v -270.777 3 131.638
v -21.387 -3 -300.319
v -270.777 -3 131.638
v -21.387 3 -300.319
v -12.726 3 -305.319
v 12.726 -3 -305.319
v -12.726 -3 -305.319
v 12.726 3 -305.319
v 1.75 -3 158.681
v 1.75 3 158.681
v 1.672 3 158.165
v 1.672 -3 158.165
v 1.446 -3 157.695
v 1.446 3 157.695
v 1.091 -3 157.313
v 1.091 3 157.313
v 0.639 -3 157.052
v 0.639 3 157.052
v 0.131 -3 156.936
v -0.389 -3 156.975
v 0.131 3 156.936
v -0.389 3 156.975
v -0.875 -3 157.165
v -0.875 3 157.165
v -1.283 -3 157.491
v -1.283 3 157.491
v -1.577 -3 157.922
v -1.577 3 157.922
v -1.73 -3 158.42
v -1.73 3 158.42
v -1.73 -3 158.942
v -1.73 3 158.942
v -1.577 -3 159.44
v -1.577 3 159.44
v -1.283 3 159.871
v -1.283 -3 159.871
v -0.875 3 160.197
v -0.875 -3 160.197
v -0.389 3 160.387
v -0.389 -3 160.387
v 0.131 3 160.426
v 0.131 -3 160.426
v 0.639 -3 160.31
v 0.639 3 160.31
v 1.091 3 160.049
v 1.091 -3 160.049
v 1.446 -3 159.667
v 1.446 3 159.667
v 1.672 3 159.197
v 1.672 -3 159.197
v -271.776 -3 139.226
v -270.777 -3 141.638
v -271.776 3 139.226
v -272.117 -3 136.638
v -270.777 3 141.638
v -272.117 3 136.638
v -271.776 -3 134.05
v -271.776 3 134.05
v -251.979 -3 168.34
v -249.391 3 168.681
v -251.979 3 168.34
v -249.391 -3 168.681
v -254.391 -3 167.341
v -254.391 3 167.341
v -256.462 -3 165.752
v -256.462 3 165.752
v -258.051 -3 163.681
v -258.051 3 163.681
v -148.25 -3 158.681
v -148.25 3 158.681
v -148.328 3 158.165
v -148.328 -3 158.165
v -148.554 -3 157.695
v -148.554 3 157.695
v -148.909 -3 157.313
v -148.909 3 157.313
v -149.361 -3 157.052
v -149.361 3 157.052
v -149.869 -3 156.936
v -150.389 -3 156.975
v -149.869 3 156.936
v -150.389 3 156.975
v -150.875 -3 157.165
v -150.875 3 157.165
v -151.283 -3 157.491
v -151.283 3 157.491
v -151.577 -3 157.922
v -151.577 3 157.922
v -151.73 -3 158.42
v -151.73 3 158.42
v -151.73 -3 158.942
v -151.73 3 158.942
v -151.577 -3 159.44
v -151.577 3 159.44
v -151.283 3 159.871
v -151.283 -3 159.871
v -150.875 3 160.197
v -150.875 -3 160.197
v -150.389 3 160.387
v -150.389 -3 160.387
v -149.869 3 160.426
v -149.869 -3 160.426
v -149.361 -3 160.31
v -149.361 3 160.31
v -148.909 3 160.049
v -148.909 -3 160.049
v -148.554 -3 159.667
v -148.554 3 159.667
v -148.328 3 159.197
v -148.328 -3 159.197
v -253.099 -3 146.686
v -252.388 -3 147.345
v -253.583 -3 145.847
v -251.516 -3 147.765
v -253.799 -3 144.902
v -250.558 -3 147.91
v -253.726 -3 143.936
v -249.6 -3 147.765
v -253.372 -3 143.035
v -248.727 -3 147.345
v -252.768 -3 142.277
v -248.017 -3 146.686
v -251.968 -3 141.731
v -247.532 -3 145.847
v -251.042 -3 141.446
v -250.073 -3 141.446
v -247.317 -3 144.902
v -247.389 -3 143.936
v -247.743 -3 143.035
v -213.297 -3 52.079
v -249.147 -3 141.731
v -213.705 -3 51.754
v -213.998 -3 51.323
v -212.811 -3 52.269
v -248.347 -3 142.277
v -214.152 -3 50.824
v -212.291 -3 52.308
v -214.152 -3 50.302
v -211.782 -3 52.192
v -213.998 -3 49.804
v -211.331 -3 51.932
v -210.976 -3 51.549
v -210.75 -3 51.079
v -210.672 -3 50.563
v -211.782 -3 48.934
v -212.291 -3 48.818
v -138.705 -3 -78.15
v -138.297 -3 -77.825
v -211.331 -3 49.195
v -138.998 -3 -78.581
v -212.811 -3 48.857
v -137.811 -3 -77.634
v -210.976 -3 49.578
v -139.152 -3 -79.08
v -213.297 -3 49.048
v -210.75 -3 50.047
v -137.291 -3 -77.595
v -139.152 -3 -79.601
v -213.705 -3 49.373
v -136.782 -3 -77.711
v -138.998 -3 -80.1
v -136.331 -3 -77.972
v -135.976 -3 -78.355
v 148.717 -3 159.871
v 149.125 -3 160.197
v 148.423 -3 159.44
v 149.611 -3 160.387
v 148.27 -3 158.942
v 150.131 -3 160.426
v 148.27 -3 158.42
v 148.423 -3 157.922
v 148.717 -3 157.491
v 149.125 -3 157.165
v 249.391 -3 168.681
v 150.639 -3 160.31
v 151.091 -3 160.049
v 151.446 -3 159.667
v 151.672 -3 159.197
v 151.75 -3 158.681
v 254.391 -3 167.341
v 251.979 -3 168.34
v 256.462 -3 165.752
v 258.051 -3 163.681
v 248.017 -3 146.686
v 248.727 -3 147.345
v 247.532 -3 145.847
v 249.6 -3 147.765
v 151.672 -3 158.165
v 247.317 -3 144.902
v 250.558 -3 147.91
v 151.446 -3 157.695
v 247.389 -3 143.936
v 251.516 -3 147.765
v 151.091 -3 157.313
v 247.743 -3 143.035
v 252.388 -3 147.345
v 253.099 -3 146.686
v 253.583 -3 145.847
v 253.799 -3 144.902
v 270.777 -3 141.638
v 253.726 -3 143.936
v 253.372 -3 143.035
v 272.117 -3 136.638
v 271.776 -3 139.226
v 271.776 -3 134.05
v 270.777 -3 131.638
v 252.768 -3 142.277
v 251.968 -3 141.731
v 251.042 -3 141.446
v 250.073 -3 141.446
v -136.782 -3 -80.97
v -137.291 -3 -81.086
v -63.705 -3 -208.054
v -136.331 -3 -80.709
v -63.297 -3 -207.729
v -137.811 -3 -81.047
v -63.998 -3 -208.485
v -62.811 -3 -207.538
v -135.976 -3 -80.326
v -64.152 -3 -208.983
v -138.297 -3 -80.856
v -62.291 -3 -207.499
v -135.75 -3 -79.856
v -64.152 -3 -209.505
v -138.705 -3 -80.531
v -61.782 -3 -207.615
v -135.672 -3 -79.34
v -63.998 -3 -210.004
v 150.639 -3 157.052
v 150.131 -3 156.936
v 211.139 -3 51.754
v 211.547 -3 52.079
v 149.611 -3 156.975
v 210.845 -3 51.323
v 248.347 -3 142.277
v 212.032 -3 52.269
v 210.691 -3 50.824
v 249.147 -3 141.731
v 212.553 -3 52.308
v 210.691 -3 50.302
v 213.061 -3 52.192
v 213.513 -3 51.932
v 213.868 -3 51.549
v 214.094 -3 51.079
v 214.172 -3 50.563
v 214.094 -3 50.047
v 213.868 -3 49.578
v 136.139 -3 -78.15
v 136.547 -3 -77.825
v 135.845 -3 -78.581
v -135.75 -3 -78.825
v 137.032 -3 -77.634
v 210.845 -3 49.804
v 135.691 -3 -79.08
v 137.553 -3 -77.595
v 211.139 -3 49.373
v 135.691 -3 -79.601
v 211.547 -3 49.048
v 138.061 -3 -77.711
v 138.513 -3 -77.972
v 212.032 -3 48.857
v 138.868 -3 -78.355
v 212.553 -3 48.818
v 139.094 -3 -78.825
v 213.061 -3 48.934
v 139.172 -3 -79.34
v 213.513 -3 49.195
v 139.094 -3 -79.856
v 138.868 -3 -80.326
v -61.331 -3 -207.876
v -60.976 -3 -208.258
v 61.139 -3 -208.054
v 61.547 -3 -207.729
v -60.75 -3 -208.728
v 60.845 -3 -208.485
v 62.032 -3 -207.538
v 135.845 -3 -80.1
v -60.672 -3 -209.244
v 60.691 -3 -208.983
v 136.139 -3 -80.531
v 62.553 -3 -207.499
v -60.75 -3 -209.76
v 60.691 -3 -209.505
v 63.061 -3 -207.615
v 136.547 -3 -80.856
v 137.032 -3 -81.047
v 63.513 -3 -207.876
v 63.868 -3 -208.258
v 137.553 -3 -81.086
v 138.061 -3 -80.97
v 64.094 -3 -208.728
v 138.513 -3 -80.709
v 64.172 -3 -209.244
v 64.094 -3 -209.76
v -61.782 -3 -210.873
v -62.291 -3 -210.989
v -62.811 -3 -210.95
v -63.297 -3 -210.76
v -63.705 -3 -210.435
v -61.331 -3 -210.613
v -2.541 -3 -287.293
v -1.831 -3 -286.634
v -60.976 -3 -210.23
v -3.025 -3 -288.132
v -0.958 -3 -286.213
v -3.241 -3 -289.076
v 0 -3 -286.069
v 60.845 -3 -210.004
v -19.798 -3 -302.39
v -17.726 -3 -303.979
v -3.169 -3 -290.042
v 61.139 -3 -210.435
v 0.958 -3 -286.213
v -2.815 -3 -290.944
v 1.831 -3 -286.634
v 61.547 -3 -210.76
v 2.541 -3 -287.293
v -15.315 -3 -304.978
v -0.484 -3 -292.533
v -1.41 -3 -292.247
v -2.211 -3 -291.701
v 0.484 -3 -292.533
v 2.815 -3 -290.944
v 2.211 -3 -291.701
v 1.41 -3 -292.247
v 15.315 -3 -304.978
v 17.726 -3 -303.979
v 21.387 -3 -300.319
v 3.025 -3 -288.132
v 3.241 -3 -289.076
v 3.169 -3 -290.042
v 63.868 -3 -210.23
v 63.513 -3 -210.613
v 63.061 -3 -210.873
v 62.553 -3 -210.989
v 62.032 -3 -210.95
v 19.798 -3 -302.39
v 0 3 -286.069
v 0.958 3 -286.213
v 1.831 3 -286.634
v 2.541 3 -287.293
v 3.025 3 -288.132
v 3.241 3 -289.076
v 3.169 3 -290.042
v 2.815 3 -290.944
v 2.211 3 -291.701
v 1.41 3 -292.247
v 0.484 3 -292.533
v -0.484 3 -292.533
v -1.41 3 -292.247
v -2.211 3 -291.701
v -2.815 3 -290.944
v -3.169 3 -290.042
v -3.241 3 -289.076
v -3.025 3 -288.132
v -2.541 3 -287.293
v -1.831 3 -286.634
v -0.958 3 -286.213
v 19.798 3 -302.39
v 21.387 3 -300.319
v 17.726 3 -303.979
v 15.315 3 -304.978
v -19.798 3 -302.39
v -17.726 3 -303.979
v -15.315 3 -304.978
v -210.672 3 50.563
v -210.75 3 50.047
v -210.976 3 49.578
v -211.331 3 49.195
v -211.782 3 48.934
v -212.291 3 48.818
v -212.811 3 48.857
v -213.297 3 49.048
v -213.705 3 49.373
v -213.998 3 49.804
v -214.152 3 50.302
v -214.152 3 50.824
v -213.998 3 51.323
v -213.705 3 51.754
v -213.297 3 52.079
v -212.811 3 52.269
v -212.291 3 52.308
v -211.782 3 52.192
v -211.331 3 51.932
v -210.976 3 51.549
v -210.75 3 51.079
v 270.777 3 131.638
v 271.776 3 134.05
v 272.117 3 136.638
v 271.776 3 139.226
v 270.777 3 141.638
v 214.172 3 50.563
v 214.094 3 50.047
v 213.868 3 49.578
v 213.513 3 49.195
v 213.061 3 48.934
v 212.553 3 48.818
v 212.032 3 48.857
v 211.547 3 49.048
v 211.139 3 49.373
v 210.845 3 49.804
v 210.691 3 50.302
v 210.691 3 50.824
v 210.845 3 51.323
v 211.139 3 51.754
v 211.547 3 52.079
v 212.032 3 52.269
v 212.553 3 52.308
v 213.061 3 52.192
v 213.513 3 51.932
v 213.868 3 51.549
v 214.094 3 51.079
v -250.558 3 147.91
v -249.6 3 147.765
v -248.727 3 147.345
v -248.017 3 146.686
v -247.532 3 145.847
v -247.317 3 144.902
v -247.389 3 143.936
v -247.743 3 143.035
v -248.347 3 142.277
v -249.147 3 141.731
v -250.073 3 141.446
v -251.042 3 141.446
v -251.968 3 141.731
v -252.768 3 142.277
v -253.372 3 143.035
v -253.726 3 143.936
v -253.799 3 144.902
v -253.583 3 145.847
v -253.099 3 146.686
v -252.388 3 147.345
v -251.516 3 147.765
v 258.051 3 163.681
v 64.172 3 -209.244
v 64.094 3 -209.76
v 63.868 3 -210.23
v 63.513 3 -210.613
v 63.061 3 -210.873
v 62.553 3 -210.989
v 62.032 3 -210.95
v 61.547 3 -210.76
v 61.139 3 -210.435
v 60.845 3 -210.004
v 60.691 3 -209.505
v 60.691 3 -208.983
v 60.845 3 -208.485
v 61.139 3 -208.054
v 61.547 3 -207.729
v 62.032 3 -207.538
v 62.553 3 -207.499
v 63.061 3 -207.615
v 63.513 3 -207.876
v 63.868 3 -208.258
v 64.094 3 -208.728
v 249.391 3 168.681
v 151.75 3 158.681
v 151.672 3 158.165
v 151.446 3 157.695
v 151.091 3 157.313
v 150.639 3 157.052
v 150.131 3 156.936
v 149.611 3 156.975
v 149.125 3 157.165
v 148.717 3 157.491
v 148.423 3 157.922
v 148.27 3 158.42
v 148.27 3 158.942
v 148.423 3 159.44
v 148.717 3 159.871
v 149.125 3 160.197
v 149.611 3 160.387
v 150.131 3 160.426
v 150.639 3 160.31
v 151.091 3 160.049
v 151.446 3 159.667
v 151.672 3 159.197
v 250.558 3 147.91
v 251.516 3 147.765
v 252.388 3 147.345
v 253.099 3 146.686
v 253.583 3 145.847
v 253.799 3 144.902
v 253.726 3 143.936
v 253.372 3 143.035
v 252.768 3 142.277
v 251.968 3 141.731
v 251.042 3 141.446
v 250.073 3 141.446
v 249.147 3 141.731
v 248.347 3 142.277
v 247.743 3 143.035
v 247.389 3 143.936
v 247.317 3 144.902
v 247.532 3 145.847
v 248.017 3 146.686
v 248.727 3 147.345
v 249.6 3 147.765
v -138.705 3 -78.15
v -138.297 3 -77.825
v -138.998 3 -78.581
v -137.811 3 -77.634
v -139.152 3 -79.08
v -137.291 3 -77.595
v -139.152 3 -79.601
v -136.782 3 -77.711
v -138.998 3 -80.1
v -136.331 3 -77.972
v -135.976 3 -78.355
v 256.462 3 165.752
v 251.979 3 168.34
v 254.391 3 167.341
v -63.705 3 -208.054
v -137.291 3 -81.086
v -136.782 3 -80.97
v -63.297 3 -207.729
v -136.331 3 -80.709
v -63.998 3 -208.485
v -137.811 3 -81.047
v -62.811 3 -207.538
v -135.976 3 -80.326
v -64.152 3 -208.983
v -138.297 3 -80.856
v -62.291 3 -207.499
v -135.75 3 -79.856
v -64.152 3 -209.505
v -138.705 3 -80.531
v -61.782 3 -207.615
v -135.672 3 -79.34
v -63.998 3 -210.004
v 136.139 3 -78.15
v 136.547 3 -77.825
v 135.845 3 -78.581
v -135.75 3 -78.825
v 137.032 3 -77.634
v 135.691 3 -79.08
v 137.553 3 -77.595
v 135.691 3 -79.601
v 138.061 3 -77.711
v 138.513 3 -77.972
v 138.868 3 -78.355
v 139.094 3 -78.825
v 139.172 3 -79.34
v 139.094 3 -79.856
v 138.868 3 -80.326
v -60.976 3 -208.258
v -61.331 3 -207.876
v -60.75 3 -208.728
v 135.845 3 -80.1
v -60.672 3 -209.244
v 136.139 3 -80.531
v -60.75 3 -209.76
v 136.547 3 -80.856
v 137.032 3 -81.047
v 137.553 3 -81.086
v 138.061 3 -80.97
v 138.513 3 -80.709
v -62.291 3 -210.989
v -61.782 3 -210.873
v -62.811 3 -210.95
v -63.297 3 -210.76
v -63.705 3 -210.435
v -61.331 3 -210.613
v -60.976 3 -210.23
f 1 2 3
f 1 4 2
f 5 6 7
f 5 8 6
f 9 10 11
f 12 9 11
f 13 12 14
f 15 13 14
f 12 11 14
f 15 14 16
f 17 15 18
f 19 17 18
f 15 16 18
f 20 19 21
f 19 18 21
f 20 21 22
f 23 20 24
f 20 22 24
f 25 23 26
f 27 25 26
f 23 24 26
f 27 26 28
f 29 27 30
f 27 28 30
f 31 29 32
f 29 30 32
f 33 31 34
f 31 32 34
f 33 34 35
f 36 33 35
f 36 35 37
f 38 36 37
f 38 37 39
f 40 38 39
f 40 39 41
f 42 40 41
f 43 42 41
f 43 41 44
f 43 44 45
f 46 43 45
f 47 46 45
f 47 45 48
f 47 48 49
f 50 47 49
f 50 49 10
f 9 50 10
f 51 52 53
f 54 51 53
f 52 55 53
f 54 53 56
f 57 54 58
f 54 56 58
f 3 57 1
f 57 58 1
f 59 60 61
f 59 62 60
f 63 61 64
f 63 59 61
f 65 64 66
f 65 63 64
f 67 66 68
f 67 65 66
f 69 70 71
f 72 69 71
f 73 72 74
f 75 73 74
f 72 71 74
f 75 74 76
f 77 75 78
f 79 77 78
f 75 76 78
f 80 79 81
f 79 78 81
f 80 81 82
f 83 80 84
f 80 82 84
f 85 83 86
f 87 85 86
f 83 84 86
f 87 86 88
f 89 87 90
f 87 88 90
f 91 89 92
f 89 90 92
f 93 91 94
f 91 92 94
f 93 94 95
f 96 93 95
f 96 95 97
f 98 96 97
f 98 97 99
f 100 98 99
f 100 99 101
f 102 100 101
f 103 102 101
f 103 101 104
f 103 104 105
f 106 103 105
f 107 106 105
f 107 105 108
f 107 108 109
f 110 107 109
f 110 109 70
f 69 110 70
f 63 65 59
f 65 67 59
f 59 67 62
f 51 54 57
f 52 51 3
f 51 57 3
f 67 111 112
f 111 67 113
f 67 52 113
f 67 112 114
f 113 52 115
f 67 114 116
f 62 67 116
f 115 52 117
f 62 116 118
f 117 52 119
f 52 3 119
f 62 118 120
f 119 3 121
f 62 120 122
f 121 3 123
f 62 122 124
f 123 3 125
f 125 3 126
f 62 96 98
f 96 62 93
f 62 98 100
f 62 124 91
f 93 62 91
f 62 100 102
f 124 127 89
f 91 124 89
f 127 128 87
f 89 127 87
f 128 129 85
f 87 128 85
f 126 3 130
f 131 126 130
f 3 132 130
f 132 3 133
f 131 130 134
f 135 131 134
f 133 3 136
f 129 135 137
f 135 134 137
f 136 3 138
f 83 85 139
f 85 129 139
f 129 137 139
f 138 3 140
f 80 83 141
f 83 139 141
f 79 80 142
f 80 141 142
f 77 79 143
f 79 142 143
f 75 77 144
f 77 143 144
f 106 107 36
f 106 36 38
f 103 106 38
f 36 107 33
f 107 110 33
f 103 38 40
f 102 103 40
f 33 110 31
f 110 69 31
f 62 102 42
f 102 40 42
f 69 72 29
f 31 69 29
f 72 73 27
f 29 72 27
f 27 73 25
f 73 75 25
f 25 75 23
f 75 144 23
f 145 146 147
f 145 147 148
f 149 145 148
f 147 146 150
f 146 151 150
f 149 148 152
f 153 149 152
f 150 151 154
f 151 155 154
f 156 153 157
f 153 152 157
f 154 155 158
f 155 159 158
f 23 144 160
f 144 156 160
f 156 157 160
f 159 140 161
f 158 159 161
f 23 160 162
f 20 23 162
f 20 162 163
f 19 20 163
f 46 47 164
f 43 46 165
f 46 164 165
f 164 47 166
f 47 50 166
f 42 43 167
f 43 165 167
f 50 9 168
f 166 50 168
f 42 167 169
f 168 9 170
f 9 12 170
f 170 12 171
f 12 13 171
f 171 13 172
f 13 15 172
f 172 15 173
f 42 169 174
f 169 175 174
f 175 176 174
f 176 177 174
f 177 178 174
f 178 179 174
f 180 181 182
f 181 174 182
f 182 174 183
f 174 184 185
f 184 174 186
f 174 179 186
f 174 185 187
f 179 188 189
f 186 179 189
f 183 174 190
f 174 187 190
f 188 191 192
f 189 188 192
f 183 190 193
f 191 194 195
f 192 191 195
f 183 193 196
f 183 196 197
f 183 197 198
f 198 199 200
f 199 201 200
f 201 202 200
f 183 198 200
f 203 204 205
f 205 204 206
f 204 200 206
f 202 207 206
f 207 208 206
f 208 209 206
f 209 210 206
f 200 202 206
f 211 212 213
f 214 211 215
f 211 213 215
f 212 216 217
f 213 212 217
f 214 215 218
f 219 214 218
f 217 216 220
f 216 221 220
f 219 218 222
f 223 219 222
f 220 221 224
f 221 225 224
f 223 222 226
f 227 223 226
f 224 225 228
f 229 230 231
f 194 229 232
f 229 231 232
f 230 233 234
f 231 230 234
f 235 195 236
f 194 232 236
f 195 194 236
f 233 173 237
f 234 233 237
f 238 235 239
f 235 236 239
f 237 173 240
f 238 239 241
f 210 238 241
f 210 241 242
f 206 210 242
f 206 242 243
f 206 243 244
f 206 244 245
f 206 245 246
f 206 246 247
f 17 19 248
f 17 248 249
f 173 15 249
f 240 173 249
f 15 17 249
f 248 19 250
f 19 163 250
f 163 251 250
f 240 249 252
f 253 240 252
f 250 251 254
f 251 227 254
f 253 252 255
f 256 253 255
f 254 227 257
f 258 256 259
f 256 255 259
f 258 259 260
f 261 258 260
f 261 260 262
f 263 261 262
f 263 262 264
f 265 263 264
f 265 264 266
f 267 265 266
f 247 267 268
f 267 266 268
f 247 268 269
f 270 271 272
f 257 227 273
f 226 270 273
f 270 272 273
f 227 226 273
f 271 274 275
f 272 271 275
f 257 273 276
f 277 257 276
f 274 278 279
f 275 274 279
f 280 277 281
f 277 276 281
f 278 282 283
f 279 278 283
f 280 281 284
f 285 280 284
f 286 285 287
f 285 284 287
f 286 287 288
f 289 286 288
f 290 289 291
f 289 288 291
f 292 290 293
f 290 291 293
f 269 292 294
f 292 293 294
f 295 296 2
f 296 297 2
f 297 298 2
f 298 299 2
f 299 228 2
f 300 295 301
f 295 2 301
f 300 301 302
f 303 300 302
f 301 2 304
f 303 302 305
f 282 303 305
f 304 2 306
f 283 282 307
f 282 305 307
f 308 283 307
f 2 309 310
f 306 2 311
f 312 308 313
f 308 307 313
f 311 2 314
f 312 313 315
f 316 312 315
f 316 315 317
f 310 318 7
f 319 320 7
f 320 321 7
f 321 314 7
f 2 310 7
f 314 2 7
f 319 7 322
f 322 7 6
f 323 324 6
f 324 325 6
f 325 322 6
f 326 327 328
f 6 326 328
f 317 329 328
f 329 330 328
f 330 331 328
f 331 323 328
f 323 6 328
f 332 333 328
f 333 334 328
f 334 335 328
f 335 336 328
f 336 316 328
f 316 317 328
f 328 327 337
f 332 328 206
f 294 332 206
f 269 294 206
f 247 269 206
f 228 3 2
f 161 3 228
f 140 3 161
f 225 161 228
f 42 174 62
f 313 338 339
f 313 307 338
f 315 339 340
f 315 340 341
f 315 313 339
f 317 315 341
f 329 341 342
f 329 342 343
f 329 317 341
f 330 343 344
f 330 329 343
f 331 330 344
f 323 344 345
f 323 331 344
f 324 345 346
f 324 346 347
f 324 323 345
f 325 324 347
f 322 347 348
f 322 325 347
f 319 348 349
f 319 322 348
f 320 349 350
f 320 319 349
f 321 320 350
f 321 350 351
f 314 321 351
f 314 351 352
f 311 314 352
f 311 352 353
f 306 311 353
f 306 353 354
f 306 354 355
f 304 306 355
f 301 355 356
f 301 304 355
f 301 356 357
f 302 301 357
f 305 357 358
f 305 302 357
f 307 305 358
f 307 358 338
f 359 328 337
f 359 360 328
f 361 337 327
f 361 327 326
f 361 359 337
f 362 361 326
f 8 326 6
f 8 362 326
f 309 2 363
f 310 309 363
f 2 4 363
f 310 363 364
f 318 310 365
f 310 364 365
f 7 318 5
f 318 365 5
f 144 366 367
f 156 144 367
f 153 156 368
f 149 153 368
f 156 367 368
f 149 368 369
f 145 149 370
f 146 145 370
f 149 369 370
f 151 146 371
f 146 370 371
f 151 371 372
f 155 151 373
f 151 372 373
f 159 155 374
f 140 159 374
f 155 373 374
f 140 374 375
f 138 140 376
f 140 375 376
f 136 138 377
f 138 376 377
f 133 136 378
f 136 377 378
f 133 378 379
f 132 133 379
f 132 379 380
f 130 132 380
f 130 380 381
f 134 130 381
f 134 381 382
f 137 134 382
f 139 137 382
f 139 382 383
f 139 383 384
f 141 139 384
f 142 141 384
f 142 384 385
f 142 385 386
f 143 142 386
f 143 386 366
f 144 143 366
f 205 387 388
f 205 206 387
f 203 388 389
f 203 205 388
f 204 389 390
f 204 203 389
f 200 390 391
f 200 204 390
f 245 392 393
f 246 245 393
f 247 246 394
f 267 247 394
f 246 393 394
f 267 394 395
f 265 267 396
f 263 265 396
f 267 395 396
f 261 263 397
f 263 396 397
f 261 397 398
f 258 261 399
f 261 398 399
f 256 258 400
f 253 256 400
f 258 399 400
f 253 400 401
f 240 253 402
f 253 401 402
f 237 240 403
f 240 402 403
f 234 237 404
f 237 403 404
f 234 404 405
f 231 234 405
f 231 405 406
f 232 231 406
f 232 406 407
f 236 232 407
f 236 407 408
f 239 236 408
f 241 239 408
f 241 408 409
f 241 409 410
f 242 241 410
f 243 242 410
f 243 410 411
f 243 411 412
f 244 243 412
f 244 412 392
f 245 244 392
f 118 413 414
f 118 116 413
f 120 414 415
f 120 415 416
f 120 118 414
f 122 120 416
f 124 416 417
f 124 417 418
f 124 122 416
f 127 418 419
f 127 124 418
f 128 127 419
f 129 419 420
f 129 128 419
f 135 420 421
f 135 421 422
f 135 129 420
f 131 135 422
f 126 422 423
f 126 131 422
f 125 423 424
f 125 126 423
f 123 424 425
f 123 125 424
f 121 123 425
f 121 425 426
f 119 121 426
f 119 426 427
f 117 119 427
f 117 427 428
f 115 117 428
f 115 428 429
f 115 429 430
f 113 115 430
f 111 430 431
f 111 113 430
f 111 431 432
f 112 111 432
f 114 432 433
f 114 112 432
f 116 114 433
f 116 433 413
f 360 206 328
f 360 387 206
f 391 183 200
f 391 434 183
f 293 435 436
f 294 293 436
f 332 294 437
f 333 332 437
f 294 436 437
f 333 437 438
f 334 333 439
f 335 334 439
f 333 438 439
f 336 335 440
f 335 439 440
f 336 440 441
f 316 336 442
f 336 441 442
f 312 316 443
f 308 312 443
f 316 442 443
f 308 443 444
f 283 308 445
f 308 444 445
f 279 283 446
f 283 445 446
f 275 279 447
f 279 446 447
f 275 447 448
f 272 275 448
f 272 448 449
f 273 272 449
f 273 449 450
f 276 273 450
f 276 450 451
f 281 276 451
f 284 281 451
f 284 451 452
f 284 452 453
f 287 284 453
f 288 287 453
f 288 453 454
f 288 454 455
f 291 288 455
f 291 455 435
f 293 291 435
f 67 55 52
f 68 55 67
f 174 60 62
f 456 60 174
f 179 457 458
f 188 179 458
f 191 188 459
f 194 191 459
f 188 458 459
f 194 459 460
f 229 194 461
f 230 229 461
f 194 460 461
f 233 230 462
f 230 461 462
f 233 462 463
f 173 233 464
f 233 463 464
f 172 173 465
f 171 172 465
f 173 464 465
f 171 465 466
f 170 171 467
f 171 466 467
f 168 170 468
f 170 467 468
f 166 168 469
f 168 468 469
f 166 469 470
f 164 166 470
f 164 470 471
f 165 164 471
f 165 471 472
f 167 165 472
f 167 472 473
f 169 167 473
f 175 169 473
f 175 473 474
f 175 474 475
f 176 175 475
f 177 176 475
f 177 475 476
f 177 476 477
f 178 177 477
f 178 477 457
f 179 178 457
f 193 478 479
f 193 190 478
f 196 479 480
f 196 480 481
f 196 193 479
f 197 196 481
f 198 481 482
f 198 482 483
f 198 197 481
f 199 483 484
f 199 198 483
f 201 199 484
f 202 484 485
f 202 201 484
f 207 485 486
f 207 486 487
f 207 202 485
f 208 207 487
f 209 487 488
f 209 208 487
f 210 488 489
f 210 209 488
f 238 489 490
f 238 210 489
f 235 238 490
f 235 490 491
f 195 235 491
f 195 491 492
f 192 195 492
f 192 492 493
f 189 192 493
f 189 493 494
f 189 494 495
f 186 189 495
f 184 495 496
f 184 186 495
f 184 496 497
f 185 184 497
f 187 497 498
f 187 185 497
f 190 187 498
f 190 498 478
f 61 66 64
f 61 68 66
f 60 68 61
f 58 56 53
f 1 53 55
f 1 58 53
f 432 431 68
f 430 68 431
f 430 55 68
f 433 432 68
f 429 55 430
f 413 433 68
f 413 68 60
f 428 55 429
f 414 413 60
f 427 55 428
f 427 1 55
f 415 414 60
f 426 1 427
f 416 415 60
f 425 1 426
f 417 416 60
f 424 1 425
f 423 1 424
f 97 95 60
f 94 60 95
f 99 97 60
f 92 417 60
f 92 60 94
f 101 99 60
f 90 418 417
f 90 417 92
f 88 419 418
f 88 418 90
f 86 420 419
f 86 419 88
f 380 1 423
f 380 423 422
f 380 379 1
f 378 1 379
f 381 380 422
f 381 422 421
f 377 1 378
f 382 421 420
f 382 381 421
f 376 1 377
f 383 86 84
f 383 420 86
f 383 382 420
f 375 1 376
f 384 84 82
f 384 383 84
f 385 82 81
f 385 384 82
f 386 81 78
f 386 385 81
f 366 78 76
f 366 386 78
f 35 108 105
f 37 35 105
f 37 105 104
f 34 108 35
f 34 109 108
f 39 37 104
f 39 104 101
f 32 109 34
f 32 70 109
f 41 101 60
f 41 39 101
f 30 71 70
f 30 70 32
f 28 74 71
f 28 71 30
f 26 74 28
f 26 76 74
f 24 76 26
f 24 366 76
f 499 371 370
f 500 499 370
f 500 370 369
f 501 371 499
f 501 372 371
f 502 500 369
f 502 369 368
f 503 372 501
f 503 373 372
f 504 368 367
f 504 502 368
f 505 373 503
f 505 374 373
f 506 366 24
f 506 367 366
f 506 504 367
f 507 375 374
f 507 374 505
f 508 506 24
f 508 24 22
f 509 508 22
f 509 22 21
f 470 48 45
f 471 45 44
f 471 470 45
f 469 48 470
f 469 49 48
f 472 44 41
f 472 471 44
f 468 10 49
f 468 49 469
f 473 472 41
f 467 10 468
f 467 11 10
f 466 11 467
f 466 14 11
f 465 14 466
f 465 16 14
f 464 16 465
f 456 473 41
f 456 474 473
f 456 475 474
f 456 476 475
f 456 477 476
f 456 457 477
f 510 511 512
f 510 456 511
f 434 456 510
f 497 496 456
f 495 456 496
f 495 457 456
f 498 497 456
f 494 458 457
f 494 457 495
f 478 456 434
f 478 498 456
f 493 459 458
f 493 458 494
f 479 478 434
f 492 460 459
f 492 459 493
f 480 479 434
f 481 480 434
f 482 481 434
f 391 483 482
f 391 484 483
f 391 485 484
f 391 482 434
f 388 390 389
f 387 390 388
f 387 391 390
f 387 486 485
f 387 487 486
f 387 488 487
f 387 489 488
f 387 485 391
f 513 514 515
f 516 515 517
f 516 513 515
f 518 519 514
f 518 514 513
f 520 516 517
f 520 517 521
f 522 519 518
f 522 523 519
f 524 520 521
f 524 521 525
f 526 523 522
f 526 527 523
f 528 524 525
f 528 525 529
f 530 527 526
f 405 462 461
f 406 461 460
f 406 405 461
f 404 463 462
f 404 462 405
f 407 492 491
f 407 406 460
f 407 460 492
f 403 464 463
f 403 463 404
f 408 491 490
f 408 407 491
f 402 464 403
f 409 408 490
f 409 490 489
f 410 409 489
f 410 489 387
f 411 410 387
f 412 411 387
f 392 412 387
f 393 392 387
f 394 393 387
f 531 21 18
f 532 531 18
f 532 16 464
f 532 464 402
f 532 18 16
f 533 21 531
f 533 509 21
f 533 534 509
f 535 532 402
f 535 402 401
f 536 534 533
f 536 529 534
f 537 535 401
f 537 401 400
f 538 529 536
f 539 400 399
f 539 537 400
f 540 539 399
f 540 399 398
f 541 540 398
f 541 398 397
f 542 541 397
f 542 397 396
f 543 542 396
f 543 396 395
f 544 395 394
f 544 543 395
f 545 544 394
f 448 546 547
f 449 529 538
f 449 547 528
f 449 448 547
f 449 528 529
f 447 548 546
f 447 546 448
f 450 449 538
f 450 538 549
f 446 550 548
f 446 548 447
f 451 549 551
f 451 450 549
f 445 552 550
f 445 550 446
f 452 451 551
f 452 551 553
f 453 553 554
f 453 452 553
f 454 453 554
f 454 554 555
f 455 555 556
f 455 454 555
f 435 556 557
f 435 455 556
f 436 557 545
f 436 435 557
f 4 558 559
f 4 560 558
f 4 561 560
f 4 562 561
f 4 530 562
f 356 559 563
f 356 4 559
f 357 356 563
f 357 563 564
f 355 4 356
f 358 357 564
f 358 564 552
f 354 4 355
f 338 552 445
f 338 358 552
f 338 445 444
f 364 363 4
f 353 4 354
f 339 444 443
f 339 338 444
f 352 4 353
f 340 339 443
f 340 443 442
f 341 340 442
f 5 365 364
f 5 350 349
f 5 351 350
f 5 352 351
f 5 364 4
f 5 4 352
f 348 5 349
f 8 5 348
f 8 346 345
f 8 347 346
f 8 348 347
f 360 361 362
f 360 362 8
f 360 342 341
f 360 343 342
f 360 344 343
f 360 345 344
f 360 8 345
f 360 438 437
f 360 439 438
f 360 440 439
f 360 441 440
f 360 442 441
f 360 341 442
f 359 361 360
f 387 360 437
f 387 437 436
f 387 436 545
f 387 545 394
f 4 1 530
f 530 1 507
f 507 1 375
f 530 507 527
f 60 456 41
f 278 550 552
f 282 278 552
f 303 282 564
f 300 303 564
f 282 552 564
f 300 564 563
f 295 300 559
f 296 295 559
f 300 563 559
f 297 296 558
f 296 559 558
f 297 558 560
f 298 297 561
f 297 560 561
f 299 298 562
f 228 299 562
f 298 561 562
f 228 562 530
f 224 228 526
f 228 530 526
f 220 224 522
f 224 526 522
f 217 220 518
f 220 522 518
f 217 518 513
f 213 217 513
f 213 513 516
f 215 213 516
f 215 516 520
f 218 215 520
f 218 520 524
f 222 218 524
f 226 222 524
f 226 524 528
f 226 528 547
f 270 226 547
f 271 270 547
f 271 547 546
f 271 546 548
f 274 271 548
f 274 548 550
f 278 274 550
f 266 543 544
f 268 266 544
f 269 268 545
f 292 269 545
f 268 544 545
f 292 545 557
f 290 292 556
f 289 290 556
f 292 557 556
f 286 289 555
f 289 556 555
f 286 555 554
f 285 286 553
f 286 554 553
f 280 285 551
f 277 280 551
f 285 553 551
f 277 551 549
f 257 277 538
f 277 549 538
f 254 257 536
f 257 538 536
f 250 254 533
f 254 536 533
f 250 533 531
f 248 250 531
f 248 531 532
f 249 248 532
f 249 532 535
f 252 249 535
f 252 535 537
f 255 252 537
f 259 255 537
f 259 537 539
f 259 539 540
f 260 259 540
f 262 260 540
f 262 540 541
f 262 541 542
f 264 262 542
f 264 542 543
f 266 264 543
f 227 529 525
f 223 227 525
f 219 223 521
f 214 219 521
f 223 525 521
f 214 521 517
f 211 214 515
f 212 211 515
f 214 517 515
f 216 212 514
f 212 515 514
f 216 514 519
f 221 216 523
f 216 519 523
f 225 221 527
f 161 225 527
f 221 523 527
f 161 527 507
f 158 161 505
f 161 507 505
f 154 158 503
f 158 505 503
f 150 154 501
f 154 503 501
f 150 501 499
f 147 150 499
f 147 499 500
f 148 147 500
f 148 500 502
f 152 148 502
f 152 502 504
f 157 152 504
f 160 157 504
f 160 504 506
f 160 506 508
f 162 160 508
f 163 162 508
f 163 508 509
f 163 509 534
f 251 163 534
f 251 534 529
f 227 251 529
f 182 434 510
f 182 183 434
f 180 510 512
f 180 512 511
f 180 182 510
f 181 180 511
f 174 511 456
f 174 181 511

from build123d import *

# Parameters (mm, degrees)
SKETCH_1_R         = 3.25
EXTRUDE_1058_DEPTH = 3
FILLET_1_R         = 10
HOLE_WIZARD_3_2_D  = 3.5


with BuildPart() as part:
    # Эскиз1 → Extrude 1058 (new, symmetric)
    with BuildSketch(Plane(origin=(0, 0, 0), x_dir=(1, 0, 0), z_dir=(0, 1, 0))):
        Polygon((273.664027596, -136.63804004), (18.5, 305.31902002), (-18.5, 305.31902002), (-273.664027596, -136.63804004), (-255.164027596, -168.68097998), (255.164027596, -168.68097998), align=None)
        with Locations(Location((0, 289.31902002, 0), (0, 0, 270))):
            Circle(SKETCH_1_R, mode=Mode.SUBTRACT)
        with Locations(Location((-250.557621135, -144.65951001, 0), (0, 0, 270))):
            Circle(SKETCH_1_R, mode=Mode.SUBTRACT)
        with Locations(Location((250.557621135, -144.65951001, 0), (0, 0, 270))):
            Circle(SKETCH_1_R, mode=Mode.SUBTRACT)
    extrude(amount=EXTRUDE_1058_DEPTH, both=True)

    # Скругление1
    fillet_1_edges = [part.edges().sort_by_distance(p)[0] for p in [
        (255.164027596, 0, 168.68097998),
        (-255.164027596, 0, 168.68097998),
        (-273.664027596, 0, 136.63804004),
        (-18.5, 0, -305.31902002),
        (18.5, 0, -305.31902002),
        (273.664027596, 0, 136.63804004),
    ]]
    fillet(fillet_1_edges, radius=FILLET_1_R)

    # К Профилю 3,2мм (through all)
    with Locations(Plane(origin=(0, -3, 0), x_dir=(-1, 0, 0), z_dir=(0, -1, 0))):
        with Locations((150, -158.68097998), (0, -158.68097998), (-150, -158.68097998), (-212.42175976, -50.563320578), (-137.42175976, 79.34048999), (-62.42175976, 209.244300558), (62.42175976, 209.244300558), (137.42175976, 79.34048999), (212.42175976, -50.563320578)):
            Hole(HOLE_WIZARD_3_2_D / 2)


solid = part.part
